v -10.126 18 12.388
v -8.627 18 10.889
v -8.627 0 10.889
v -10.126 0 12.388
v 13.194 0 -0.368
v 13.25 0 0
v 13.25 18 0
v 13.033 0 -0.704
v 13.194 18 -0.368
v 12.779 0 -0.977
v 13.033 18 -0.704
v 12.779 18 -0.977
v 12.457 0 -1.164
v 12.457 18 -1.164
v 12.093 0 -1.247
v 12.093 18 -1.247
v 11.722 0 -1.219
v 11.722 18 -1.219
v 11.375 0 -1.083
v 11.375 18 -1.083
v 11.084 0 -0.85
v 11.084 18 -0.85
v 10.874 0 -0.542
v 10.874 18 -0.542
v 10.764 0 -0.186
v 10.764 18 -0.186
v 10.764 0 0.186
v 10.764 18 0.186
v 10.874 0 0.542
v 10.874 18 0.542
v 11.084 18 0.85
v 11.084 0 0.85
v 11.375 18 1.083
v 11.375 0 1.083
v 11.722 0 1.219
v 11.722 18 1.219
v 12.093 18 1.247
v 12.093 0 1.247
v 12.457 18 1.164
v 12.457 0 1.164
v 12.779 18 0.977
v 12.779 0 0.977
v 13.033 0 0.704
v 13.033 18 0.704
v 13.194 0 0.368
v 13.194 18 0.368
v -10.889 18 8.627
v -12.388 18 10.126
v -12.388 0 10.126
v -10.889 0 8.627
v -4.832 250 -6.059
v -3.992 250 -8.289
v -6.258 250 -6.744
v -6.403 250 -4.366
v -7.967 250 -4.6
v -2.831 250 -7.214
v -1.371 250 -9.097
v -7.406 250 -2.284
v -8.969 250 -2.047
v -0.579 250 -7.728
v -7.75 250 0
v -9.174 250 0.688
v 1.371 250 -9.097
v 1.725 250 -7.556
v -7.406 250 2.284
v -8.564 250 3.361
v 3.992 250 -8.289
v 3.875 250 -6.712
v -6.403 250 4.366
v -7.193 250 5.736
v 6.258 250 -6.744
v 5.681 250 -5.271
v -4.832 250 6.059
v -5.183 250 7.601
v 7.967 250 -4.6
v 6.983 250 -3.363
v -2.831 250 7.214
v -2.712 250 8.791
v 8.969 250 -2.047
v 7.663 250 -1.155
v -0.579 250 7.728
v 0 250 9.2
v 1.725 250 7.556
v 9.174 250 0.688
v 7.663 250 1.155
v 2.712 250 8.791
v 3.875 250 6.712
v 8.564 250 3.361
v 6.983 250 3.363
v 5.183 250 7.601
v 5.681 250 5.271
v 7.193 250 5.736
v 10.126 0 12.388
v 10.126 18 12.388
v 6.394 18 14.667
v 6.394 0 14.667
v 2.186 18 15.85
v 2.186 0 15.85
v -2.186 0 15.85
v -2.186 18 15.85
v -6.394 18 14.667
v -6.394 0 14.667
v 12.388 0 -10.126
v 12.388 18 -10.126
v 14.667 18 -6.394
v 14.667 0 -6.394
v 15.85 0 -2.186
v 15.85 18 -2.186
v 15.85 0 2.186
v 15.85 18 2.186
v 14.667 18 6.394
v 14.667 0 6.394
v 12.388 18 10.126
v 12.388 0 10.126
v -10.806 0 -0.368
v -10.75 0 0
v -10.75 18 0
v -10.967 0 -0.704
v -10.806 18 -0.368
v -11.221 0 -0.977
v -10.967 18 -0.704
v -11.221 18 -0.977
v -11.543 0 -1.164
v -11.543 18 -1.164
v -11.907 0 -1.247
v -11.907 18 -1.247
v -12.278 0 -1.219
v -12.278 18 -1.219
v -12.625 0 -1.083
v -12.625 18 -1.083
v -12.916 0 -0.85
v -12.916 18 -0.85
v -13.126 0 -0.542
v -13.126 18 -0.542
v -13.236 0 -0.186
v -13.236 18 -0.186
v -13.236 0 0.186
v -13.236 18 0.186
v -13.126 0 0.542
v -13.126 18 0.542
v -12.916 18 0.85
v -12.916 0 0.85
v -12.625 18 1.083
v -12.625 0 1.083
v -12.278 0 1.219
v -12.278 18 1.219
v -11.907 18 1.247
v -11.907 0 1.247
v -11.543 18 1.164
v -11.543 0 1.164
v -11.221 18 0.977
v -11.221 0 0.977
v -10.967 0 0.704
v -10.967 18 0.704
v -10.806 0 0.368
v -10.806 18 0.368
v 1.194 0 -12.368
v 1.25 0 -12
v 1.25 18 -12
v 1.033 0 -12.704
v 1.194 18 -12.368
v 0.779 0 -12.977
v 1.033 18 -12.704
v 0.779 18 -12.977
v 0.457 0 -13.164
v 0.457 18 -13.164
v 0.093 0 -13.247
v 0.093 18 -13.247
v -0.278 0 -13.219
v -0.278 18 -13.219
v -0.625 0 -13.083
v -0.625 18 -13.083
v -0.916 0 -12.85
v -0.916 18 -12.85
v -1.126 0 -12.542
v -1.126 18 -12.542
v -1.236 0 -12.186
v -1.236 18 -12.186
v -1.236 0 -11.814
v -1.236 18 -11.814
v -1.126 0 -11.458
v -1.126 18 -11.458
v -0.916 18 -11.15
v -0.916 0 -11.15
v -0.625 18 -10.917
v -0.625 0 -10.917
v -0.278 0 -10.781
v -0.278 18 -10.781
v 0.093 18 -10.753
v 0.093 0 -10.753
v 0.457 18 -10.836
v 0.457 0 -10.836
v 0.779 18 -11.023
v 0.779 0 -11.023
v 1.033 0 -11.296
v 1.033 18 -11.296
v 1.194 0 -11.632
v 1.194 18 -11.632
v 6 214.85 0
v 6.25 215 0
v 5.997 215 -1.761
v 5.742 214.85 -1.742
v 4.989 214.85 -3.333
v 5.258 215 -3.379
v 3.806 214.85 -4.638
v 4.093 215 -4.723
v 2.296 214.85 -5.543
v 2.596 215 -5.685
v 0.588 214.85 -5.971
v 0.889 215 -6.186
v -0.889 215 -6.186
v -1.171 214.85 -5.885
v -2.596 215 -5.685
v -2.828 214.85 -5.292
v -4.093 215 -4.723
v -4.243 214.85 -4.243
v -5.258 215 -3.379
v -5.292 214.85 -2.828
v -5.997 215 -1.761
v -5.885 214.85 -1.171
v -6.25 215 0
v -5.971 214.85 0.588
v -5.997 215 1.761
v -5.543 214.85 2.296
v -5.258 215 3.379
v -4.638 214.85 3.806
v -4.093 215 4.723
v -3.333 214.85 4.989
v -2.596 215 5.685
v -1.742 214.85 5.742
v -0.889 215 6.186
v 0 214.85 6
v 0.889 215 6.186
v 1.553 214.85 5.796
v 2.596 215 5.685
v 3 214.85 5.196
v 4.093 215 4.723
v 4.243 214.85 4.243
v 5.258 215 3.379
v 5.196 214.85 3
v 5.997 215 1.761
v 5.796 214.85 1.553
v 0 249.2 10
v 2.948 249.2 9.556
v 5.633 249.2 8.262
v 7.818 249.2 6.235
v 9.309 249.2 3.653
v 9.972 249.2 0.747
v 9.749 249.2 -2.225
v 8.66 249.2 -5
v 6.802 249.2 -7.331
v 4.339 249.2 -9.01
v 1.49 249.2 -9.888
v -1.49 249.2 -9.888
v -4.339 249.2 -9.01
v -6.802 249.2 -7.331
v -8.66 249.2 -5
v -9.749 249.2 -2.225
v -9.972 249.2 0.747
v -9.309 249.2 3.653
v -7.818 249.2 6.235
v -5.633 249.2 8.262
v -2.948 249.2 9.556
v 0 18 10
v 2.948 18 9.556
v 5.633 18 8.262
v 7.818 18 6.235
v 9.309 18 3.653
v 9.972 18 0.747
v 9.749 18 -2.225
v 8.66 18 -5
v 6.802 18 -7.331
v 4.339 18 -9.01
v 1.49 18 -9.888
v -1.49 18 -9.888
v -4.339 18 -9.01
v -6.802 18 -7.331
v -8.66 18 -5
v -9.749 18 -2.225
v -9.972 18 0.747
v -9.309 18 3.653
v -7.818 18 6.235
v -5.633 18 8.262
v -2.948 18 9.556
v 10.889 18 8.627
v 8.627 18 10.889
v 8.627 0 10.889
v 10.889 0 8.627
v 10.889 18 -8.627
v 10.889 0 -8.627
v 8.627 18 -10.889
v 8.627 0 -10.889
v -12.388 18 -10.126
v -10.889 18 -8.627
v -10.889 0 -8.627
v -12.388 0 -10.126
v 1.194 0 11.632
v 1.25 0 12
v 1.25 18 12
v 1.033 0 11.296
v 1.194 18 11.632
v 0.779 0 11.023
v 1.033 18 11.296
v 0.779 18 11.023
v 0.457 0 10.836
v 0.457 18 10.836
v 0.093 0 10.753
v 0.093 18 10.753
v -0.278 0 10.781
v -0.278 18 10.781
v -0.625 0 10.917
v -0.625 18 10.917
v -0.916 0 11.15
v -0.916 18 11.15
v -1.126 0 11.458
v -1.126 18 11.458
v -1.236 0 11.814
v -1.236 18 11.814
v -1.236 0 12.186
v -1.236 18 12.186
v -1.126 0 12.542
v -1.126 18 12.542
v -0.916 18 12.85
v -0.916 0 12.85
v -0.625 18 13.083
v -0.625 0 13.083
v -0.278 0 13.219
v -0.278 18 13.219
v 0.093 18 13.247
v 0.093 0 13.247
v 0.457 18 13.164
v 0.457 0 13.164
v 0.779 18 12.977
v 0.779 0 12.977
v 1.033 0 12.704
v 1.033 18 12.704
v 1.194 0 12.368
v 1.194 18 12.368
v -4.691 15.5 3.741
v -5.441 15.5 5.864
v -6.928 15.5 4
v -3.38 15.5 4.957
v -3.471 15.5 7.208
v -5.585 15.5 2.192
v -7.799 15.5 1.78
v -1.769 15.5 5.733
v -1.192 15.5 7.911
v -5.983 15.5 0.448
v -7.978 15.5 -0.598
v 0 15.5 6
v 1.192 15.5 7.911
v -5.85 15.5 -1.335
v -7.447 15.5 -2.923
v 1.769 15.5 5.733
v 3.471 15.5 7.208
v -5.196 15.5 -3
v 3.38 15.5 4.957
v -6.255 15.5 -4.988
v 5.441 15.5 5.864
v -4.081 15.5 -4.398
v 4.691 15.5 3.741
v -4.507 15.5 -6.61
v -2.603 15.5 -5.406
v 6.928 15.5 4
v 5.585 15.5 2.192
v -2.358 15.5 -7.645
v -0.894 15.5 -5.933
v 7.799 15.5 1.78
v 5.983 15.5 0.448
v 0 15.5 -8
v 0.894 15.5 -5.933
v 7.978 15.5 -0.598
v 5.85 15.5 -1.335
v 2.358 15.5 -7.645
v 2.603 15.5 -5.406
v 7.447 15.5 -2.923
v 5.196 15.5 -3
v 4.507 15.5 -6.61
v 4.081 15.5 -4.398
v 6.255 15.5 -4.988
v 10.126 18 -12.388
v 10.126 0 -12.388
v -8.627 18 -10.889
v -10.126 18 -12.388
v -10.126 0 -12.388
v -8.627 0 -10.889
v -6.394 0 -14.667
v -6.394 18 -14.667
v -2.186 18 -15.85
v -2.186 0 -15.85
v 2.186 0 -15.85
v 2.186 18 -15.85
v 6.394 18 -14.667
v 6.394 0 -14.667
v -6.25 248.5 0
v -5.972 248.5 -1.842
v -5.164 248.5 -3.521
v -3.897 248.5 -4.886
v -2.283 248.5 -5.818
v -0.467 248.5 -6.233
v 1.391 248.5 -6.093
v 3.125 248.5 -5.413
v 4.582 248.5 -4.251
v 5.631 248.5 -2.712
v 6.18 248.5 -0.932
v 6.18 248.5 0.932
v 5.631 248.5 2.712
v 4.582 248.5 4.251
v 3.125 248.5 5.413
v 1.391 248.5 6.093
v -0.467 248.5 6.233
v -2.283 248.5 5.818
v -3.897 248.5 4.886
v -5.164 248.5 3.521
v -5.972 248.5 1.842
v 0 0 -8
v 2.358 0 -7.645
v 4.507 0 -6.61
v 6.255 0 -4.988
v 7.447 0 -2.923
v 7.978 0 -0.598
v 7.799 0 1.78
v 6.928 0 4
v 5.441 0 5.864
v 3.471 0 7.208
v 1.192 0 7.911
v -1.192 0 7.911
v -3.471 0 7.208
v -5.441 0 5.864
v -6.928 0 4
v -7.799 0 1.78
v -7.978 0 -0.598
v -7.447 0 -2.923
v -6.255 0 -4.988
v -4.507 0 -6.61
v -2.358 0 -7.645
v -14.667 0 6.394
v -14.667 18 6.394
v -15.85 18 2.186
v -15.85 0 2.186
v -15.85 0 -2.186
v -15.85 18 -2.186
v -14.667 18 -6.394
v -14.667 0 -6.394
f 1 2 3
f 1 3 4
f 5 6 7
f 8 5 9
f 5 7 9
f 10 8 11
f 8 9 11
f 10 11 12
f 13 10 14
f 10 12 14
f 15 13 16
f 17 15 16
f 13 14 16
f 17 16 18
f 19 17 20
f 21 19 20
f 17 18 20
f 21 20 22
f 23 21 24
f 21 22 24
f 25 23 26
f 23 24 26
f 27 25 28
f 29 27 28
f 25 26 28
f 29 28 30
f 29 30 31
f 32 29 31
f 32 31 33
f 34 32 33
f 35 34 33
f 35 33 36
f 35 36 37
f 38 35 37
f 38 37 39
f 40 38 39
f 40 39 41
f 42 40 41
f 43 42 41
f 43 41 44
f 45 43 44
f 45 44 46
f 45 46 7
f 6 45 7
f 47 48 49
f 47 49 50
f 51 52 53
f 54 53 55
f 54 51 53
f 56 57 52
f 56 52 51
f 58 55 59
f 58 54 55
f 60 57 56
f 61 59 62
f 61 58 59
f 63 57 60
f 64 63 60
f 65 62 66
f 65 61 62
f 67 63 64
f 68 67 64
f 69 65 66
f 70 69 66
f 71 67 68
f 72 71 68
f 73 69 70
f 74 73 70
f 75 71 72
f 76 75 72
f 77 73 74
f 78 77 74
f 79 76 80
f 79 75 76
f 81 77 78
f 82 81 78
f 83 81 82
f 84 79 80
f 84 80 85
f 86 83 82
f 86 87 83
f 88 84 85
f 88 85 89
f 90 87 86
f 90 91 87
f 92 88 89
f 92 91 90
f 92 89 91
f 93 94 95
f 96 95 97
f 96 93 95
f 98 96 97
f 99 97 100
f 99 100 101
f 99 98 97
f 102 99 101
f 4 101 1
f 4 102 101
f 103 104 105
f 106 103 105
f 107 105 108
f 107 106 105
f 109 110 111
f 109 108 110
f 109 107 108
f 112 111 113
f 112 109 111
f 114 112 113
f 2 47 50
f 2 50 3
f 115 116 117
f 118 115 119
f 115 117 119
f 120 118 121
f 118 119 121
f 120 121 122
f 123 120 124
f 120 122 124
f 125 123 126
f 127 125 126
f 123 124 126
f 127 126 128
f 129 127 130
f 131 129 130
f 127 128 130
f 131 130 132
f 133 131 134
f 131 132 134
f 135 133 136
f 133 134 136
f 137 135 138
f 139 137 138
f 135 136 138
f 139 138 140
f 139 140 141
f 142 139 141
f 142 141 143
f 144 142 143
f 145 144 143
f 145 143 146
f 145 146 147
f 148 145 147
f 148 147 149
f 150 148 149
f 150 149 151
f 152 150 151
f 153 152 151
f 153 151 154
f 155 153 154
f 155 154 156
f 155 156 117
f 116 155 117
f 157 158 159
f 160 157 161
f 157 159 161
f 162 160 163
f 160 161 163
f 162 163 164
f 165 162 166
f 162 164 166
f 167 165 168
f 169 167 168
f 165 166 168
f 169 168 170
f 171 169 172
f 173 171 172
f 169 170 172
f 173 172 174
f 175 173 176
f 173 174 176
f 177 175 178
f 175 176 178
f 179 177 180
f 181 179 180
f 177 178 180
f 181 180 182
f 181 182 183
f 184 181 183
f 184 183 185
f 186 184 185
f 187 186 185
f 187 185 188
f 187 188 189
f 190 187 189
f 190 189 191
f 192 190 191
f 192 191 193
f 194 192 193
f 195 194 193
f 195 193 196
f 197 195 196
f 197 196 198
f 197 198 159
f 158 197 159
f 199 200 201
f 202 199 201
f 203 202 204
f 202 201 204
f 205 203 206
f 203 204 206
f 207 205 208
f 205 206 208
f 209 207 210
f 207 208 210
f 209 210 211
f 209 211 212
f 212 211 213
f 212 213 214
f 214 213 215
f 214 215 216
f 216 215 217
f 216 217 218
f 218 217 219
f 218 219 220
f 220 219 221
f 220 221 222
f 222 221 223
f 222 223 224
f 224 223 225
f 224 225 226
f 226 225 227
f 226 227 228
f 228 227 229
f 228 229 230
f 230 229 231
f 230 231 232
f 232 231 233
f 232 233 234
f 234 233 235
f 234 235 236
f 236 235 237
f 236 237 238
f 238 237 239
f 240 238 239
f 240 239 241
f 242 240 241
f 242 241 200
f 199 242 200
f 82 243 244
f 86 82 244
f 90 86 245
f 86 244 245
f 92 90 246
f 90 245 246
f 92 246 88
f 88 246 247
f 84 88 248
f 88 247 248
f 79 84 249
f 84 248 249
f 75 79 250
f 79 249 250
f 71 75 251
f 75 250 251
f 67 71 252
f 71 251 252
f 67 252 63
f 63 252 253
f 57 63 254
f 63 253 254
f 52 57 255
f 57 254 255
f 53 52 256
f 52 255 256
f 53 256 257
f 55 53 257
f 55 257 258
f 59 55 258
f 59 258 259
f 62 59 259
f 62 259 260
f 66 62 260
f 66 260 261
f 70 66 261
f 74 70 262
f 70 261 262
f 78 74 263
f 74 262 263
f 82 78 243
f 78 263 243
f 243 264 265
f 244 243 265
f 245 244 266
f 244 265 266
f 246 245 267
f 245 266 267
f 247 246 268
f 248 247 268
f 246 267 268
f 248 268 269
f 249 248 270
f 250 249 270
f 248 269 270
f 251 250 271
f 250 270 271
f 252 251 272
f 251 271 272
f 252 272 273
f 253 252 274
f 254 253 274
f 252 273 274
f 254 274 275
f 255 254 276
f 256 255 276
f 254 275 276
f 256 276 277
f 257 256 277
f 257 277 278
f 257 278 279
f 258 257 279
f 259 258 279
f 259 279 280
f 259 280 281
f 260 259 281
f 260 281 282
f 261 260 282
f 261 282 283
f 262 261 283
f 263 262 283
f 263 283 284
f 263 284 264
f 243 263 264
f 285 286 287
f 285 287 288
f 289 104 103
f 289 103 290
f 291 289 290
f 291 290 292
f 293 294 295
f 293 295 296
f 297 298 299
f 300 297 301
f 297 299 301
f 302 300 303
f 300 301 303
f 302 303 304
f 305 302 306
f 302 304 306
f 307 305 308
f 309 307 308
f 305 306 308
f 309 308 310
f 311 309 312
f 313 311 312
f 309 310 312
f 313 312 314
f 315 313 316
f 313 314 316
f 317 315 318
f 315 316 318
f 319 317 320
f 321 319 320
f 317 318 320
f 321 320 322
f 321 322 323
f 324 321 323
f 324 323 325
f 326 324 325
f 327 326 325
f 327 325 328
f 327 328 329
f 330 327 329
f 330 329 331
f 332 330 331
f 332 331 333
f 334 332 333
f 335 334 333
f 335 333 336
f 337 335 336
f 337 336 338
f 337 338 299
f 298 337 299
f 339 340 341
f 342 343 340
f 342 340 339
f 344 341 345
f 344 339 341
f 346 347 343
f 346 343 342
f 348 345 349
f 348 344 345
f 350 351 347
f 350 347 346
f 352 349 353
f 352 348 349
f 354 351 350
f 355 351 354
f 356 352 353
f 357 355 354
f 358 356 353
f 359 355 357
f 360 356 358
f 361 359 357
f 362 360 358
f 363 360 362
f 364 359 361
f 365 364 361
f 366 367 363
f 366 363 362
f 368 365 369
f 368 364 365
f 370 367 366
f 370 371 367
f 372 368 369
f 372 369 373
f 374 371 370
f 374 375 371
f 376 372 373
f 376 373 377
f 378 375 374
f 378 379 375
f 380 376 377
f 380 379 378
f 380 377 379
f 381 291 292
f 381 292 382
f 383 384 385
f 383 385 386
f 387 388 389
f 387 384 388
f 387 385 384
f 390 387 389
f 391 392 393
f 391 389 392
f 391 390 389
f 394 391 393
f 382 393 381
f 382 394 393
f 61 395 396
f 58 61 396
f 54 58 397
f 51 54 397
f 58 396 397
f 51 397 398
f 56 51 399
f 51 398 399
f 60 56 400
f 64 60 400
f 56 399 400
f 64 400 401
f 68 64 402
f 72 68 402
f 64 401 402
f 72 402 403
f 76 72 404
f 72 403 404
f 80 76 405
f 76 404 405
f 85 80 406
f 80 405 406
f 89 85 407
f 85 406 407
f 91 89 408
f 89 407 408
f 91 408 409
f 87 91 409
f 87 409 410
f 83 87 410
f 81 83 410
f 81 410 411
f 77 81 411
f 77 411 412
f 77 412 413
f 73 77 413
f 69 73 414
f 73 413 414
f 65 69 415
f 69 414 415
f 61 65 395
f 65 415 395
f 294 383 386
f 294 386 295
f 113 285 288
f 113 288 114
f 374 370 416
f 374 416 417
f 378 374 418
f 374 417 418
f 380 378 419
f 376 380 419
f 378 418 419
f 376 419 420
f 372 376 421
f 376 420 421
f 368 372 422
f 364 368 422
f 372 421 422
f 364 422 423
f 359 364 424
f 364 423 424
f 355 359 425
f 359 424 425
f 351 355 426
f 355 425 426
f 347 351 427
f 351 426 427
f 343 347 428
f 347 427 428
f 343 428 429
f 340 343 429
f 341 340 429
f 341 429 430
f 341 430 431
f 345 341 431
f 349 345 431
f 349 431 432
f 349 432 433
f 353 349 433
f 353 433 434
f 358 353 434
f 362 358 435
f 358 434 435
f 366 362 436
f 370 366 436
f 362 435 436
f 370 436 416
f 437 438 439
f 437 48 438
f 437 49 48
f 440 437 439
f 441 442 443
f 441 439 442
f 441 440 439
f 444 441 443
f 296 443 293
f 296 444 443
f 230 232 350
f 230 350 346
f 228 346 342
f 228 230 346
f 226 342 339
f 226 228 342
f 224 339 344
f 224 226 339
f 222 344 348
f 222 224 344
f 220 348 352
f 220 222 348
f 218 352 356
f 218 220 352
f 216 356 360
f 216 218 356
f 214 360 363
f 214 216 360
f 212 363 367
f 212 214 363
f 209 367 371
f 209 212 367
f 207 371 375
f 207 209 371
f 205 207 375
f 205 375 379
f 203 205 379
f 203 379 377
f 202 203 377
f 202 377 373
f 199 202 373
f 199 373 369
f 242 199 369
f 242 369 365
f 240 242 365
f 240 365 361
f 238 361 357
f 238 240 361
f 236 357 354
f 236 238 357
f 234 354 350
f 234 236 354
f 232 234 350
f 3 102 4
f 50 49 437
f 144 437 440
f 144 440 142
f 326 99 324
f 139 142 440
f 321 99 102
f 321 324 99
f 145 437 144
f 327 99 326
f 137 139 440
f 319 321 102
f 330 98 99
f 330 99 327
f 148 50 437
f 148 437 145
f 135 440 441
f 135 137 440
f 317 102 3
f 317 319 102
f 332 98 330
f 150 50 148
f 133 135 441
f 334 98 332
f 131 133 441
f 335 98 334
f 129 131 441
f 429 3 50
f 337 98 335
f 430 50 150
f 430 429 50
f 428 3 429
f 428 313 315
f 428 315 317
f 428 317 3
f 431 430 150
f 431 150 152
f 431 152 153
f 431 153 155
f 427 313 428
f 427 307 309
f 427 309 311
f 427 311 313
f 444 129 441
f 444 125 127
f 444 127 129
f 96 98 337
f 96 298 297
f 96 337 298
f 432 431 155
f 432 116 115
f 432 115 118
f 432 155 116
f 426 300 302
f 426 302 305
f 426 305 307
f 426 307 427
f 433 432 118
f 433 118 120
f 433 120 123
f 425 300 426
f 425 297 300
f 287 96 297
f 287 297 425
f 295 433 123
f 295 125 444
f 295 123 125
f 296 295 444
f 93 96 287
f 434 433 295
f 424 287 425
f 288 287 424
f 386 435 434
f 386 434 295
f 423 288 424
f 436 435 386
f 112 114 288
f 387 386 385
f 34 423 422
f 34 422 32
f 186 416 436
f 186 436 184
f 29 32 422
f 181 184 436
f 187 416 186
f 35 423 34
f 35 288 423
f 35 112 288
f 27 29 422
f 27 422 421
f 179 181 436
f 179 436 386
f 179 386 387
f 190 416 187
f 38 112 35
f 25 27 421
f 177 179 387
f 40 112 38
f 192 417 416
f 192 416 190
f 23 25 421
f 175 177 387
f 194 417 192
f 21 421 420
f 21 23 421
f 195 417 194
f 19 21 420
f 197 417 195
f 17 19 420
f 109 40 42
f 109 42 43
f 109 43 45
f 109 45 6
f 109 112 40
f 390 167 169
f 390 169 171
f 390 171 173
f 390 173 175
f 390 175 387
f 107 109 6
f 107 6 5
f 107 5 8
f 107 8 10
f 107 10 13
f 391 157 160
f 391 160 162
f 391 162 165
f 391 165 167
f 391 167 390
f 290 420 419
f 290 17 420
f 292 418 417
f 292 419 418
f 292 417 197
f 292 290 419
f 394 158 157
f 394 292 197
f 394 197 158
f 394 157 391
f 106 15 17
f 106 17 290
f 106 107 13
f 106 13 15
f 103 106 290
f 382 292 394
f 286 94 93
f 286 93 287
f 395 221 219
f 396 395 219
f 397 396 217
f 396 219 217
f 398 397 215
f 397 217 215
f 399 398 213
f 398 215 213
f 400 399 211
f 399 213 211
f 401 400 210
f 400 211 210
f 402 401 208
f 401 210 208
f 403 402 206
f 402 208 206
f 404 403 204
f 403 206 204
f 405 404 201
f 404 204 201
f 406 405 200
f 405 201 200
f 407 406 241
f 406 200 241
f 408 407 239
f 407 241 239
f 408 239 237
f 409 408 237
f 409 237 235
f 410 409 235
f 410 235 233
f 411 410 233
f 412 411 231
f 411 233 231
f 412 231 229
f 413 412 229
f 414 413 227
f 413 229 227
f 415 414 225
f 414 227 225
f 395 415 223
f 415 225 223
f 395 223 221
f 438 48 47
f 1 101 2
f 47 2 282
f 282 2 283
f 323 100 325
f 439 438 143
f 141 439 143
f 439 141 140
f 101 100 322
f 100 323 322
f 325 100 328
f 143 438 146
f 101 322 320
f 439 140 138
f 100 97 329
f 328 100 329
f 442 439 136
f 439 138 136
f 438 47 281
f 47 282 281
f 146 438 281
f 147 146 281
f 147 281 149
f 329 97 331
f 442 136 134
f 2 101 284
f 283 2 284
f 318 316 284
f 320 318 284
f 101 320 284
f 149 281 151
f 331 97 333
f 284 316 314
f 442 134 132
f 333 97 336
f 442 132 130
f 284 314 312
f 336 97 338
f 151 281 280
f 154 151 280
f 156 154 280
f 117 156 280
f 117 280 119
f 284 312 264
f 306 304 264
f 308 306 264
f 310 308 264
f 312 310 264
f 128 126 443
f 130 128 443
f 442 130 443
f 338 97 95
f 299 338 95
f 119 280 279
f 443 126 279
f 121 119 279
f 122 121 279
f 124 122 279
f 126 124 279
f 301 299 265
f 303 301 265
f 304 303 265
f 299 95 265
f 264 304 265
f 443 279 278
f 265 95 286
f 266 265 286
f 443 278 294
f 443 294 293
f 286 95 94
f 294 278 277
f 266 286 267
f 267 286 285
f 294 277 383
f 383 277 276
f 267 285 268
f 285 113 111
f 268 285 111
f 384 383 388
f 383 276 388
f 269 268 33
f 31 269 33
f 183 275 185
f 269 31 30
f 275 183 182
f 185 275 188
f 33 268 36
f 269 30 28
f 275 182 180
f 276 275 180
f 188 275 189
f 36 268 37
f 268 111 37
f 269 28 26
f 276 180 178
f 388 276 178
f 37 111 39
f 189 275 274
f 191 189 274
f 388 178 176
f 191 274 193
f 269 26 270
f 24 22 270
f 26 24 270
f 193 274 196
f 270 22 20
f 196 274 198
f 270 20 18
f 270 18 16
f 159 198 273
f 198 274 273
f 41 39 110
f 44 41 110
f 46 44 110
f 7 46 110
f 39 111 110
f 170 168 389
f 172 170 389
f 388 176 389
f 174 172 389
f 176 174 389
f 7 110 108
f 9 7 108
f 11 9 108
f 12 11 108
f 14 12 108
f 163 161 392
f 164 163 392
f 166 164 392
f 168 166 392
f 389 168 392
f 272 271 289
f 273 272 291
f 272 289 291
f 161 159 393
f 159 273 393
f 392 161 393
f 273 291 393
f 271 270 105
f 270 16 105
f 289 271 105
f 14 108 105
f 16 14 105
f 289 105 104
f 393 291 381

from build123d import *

# Parameters (mm, degrees)
SKETCH_1_R               = 10
EXTRUDE_1_DEPTH          = 250
SKETCH_6_R               = 16
EXTRUDE_2_DEPTH          = 18
CUT_EXTRUDE_START        = 30
SKETCH_2_R               = 6
CUT_EXTRUDE_1_DEPTH      = 260
M14X1_5_1_D              = 12.5
M14X1_5_1_DEPTH          = 35
M14X1_5_1_TIP            = 3.755378869
CHAMFER_1_SIZE           = 1.5
SKETCH_8_R               = 8
CUT_EXTRUDE_2_DEPTH      = 15.5
HOLE_WIZARD_M3_1_D       = 2.5
HOLE_WIZARD_M3_1_DEPTH   = 25
HOLE_WIZARD_M3_1_TIP     = 0.751075774
CUT_EXTRUDE_1_2_DEPTH    = 252.021911394
PATTERN_CIRCULAR_1_COUNT = 4
CHAMFER_2_SIZE           = 0.8


with BuildPart() as part:
    # 草图1 → 凸台-拉伸1 (new body)
    with BuildSketch(Plane(origin=(0, 0, 0), x_dir=(1, 0, 0), z_dir=(0, 1, 0))):
        with Locations(Location((0, 0, 0), (0, 0, 270))):
            Circle(SKETCH_1_R)
    extrude(amount=EXTRUDE_1_DEPTH)

    # 草图6 → 凸台-拉伸2 (add)
    with BuildSketch(Plane.XZ):
        with Locations(Location((0, 0, 0), (0, 0, 270))):
            Circle(SKETCH_6_R)
    extrude(amount=-EXTRUDE_2_DEPTH)

    # 草图2 → Cut-Extrude 1 (cut)
    with BuildSketch(Plane.XZ.offset(-250).offset(CUT_EXTRUDE_START)):
        with Locations(Location((0, 0, 0), (0, 0, 90))):
            Circle(SKETCH_2_R)
    extrude(amount=CUT_EXTRUDE_1_DEPTH, mode=Mode.SUBTRACT)

    # M14x1.5 螺纹孔1
    with Locations(Plane(origin=(0, 250, 0), x_dir=(1, 0, 0), z_dir=(0, 1, 0))):
        with Locations((0, 0)):
            Hole(M14X1_5_1_D / 2, depth=M14X1_5_1_DEPTH)
            with Locations((0, 0, -(M14X1_5_1_DEPTH + M14X1_5_1_TIP / 2))):  # 118° drill point
                Cone(0, M14X1_5_1_D / 2, M14X1_5_1_TIP, mode=Mode.SUBTRACT)

    # 倒角1
    chamfer_1_edges = [part.edges().sort_by_distance(p)[0] for p in [
        (6.25, 250, 0),
    ]]
    chamfer(chamfer_1_edges, length=CHAMFER_1_SIZE)

    # 草图8 → 切除-拉伸2 (cut)
    with BuildSketch(Plane.XZ):
        with Locations(Location((0, 0, 0), (0, 0, 270))):
            Circle(SKETCH_8_R)
    extrude(amount=-CUT_EXTRUDE_2_DEPTH, mode=Mode.SUBTRACT)

    # M3 螺纹孔1
    with Locations(Plane(origin=(0, 0, 0), x_dir=(-1, 0, 0), z_dir=(0, -1, 0))):
        with Locations((0, 12), (12, 0), (0, -12), (-12, 0)):
            Hole(HOLE_WIZARD_M3_1_D / 2, depth=HOLE_WIZARD_M3_1_DEPTH)
            with Locations((0, 0, -(HOLE_WIZARD_M3_1_DEPTH + HOLE_WIZARD_M3_1_TIP / 2))):  # 118° drill point
                Cone(0, HOLE_WIZARD_M3_1_D / 2, HOLE_WIZARD_M3_1_TIP, mode=Mode.SUBTRACT)

    # 草图13 → Cut-Extrude 1 2 (cut, symmetric)
    with BuildSketch(Plane.XZ):
        Polygon((-8.62670273, 10.88944443), (-10.182337649, 12.445079349), (-12.445079349, 10.182337649), (-10.88944443, 8.62670273), align=None)
    cut_extrude_1_2 = extrude(amount=CUT_EXTRUDE_1_2_DEPTH, both=True, mode=Mode.SUBTRACT)

    # 阵列(圆周)1: Cut-Extrude 1 2 ×4 about axis
    pattern_circular_1_axis = Axis((0, 0, 0), (0, 1, 0))
    for i in range(1, PATTERN_CIRCULAR_1_COUNT):
        add(cut_extrude_1_2.rotate(pattern_circular_1_axis, i * 360 / PATTERN_CIRCULAR_1_COUNT), mode=Mode.SUBTRACT)

    # 倒角2
    chamfer_2_edges = [part.edges().sort_by_distance(p)[0] for p in [
        (0, 250, -10),
    ]]
    chamfer(chamfer_2_edges, length=CHAMFER_2_SIZE)


solid = part.part
